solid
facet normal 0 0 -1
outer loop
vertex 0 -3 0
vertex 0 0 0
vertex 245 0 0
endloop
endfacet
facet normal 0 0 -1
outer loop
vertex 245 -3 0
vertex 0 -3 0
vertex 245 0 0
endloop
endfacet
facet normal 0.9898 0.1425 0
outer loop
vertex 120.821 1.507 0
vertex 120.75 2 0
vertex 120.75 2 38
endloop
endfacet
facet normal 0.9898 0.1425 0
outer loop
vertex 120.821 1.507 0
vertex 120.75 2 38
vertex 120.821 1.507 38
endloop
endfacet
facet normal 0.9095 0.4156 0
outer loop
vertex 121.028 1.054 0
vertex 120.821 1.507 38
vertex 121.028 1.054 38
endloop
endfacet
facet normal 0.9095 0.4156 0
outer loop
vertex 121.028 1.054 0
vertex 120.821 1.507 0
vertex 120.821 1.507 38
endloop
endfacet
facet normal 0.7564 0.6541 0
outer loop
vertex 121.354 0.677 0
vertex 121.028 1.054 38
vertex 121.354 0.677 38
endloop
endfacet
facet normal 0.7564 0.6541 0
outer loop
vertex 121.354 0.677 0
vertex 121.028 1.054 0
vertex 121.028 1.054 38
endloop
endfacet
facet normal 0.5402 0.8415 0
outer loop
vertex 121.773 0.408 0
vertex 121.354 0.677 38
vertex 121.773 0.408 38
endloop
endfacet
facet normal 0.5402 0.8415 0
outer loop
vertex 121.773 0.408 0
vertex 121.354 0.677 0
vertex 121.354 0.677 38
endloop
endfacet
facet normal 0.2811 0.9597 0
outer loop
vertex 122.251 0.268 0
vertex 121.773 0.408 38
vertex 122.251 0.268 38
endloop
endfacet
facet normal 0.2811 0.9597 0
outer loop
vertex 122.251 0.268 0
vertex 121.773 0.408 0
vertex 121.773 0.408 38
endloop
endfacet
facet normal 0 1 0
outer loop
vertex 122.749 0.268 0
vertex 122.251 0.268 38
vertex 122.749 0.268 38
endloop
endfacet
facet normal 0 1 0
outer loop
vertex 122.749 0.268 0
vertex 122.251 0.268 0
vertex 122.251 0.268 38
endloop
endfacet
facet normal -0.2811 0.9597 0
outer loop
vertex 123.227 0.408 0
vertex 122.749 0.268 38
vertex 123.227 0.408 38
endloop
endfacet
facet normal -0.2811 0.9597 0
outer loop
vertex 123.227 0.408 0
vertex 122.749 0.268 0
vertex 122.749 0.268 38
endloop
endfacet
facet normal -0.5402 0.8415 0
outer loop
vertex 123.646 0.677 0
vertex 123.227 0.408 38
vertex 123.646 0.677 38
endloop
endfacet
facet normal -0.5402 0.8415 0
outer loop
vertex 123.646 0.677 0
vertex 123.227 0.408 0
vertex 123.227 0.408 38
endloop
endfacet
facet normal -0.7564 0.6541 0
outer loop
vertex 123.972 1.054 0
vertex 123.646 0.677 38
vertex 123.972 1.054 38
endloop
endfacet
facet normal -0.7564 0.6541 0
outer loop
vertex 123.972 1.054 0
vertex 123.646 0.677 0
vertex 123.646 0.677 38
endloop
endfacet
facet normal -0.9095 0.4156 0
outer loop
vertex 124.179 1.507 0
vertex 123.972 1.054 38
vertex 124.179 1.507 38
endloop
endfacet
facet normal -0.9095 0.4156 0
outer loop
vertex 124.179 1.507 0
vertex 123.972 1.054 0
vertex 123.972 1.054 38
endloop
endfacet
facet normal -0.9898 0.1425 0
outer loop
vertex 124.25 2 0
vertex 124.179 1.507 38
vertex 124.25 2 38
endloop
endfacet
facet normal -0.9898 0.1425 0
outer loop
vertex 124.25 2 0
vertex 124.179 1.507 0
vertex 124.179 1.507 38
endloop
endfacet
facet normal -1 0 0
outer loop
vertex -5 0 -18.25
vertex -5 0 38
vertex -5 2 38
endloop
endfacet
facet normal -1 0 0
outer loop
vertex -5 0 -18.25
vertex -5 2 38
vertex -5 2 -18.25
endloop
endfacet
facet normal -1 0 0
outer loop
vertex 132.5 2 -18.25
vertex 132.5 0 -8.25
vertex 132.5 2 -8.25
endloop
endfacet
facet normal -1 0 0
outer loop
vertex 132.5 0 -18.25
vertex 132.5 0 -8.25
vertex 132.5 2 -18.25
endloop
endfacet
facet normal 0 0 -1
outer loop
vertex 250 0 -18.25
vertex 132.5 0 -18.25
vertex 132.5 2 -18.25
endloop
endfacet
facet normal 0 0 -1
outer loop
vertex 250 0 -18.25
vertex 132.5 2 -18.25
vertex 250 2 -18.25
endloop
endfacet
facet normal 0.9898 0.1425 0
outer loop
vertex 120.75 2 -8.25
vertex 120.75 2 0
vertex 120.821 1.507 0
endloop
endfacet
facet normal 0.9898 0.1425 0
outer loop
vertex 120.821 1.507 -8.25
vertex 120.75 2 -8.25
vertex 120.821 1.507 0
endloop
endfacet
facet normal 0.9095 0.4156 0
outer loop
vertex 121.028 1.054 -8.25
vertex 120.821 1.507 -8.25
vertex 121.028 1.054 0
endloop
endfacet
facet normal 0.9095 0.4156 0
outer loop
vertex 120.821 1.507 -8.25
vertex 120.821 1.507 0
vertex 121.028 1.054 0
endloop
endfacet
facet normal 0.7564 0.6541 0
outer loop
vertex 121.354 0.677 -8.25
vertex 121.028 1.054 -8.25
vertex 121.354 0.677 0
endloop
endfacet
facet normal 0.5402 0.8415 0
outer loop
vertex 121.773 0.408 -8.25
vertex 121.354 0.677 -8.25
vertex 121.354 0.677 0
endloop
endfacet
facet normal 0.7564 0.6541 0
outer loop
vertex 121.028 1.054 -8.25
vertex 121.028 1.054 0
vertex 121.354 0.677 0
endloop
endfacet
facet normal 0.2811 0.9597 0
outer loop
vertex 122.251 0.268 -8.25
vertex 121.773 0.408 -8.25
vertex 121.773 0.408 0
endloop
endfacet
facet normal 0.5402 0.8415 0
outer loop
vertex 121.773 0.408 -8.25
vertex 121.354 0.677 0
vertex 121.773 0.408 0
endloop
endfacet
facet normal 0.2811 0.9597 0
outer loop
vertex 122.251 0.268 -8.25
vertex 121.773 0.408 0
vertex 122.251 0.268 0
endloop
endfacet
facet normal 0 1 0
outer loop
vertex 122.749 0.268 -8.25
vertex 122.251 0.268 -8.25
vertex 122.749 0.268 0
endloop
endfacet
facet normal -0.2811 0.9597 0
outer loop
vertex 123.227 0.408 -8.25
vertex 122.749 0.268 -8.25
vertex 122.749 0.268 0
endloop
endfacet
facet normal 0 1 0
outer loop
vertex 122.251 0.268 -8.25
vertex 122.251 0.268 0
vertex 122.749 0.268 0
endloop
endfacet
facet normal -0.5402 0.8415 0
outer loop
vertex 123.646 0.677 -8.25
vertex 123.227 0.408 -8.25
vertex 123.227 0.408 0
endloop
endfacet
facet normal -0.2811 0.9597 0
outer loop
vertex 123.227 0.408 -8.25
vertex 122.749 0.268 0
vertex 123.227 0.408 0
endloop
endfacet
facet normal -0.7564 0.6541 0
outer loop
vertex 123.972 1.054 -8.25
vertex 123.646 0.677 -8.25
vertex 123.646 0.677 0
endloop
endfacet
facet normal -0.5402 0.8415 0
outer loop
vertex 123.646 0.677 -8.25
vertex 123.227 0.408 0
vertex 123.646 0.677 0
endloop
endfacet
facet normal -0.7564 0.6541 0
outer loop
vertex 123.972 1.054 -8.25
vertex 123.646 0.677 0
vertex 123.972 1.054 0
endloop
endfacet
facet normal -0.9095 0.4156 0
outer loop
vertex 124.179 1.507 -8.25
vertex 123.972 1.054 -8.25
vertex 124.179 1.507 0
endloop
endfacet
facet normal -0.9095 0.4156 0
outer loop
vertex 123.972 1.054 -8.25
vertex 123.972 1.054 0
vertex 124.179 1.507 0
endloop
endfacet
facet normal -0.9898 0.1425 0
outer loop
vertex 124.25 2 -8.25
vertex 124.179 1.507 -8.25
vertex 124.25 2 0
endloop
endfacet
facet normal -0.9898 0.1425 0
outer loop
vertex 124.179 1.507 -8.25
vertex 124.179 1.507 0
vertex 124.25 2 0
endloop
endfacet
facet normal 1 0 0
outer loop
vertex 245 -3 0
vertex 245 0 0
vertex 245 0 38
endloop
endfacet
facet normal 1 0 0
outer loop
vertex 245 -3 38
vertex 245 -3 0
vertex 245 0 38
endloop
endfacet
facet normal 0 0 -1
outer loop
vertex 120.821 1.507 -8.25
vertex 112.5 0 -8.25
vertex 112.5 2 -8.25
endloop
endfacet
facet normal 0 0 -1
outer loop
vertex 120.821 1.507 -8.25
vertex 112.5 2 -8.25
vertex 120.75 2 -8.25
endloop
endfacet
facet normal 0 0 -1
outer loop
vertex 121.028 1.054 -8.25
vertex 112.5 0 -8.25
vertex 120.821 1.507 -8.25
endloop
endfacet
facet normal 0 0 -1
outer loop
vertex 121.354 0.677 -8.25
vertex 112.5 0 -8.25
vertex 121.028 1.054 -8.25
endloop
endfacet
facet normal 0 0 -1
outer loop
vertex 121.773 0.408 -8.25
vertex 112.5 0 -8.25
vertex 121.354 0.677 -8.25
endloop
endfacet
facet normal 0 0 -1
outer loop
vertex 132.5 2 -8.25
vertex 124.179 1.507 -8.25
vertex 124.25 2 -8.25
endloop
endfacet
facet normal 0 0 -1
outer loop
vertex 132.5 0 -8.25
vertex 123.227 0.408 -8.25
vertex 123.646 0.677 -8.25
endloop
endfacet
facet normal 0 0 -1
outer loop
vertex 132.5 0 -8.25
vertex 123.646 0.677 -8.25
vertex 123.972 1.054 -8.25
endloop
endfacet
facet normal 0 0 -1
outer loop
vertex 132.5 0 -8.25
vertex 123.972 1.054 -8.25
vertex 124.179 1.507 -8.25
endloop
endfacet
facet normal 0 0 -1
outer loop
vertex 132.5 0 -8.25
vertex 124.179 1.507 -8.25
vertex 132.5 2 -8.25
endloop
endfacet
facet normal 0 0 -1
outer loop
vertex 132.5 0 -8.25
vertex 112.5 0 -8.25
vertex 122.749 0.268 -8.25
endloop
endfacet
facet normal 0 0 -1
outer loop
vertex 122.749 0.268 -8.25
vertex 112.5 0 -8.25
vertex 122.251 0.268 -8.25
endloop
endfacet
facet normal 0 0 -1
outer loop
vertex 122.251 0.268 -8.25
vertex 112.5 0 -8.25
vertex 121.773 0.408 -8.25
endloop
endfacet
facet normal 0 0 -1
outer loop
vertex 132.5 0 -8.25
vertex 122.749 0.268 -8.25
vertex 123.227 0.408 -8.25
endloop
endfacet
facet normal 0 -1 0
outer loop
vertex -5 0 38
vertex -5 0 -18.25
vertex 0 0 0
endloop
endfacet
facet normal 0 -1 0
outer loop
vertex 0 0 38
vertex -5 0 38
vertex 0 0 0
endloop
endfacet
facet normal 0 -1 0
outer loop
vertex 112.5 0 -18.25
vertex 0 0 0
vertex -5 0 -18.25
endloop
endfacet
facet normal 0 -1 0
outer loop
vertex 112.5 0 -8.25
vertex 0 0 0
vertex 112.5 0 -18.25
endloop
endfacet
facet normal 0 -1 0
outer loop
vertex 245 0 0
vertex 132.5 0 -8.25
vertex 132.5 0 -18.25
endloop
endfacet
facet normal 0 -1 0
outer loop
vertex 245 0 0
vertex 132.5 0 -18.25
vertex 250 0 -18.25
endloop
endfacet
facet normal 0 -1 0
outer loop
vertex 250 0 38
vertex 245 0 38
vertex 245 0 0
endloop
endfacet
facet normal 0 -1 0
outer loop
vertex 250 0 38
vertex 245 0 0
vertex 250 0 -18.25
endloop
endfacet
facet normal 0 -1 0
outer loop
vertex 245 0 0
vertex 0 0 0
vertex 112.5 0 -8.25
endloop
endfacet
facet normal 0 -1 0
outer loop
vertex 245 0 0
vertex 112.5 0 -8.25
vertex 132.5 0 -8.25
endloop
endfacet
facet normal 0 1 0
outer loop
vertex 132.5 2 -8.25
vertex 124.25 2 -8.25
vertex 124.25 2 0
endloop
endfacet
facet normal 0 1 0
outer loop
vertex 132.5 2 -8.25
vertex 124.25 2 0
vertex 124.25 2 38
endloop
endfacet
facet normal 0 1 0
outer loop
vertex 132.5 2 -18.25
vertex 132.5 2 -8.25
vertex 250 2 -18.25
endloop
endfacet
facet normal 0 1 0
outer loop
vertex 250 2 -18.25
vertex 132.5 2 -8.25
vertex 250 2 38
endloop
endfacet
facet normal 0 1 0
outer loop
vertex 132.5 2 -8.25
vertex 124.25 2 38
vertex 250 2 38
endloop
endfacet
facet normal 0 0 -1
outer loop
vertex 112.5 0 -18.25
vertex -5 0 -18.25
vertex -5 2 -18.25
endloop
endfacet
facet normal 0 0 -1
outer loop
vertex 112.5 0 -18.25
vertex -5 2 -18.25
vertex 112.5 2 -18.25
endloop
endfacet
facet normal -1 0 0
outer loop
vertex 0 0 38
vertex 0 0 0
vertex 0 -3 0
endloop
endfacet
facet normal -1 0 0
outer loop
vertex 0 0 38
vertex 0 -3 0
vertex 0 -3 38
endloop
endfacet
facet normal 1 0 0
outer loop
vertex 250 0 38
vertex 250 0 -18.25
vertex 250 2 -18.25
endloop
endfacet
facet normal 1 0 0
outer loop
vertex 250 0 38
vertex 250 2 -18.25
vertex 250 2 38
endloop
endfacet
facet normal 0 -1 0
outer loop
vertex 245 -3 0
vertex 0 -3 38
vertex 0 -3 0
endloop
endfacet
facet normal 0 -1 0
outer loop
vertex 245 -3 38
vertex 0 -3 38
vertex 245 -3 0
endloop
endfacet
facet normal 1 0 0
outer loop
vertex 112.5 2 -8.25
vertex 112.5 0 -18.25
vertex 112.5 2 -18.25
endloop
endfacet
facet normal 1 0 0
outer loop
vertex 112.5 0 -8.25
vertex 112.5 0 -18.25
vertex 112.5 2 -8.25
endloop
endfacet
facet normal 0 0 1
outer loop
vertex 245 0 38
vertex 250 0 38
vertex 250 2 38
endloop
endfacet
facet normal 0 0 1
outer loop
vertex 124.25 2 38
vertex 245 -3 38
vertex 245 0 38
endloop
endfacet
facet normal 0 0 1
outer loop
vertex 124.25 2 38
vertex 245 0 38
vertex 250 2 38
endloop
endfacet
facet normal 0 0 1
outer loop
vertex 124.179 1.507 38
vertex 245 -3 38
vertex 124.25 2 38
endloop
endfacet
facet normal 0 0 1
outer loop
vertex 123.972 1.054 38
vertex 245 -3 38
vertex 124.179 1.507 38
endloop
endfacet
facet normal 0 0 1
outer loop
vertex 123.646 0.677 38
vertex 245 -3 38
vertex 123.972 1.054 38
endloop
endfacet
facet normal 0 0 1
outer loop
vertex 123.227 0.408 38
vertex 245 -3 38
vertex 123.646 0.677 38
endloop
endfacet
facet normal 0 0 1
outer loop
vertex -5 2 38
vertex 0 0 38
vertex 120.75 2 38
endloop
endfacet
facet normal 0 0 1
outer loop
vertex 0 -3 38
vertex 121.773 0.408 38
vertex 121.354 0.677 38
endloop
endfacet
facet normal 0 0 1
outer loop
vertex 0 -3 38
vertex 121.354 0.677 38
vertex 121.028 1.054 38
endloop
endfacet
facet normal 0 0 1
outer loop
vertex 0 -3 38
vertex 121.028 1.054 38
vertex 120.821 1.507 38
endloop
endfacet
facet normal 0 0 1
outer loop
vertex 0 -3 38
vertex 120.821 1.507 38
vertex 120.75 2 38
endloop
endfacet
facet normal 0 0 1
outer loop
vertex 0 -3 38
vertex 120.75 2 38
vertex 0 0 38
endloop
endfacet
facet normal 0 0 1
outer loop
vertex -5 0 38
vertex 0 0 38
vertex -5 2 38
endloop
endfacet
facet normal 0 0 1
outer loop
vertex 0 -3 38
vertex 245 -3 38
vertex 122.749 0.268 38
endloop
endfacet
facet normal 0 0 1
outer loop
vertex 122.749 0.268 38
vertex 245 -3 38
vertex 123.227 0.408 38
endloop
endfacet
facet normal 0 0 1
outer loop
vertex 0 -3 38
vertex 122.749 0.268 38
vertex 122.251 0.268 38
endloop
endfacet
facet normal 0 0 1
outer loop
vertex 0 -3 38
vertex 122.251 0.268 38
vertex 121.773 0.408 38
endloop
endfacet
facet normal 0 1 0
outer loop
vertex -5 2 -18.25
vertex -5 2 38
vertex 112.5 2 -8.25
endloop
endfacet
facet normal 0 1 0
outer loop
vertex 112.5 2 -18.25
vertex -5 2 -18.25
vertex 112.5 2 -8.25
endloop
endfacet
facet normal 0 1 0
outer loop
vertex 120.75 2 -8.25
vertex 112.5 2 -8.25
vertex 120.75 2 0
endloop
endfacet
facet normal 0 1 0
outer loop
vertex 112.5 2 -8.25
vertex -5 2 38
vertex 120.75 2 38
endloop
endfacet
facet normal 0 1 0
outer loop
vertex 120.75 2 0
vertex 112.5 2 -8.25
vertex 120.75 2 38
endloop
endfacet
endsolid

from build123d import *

# Parameters (mm, degrees)
SKETCH074_W          = 245
SKETCH074_H          = 38
PAD035_DEPTH         = 3
PAD036_DEPTH         = 2
SKETCH087_R          = 1.75
POCKET037_DEPTH      = 18.251
POCKET037_DEPTH_BACK = 38.001


with BuildPart() as part:
    # Sketch074 → Pad035 (new body)
    with BuildSketch(Plane.XZ):
        with Locations((122.5, 19)):
            Rectangle(SKETCH074_W, SKETCH074_H)
    extrude(amount=PAD035_DEPTH)

    # Sketch075 → Pad036 (join)
    with BuildSketch(Plane.XZ):
        Polygon((-5, 38), (-5, -18.25), (112.5, -18.25), (112.5, -8.25), (132.5, -8.25), (132.5, -18.25), (250, -18.25), (250, 38), align=None)
    extrude(amount=-PAD036_DEPTH)

    # Sketch087 → Pocket037 (cut, two sides)
    with BuildSketch(Plane.XY) as pocket037_sk:
        with Locations((122.5, 2)):
            Circle(SKETCH087_R)
    extrude(amount=-POCKET037_DEPTH, mode=Mode.SUBTRACT)
    extrude(pocket037_sk.sketch, amount=POCKET037_DEPTH_BACK, mode=Mode.SUBTRACT)


solid = part.part
